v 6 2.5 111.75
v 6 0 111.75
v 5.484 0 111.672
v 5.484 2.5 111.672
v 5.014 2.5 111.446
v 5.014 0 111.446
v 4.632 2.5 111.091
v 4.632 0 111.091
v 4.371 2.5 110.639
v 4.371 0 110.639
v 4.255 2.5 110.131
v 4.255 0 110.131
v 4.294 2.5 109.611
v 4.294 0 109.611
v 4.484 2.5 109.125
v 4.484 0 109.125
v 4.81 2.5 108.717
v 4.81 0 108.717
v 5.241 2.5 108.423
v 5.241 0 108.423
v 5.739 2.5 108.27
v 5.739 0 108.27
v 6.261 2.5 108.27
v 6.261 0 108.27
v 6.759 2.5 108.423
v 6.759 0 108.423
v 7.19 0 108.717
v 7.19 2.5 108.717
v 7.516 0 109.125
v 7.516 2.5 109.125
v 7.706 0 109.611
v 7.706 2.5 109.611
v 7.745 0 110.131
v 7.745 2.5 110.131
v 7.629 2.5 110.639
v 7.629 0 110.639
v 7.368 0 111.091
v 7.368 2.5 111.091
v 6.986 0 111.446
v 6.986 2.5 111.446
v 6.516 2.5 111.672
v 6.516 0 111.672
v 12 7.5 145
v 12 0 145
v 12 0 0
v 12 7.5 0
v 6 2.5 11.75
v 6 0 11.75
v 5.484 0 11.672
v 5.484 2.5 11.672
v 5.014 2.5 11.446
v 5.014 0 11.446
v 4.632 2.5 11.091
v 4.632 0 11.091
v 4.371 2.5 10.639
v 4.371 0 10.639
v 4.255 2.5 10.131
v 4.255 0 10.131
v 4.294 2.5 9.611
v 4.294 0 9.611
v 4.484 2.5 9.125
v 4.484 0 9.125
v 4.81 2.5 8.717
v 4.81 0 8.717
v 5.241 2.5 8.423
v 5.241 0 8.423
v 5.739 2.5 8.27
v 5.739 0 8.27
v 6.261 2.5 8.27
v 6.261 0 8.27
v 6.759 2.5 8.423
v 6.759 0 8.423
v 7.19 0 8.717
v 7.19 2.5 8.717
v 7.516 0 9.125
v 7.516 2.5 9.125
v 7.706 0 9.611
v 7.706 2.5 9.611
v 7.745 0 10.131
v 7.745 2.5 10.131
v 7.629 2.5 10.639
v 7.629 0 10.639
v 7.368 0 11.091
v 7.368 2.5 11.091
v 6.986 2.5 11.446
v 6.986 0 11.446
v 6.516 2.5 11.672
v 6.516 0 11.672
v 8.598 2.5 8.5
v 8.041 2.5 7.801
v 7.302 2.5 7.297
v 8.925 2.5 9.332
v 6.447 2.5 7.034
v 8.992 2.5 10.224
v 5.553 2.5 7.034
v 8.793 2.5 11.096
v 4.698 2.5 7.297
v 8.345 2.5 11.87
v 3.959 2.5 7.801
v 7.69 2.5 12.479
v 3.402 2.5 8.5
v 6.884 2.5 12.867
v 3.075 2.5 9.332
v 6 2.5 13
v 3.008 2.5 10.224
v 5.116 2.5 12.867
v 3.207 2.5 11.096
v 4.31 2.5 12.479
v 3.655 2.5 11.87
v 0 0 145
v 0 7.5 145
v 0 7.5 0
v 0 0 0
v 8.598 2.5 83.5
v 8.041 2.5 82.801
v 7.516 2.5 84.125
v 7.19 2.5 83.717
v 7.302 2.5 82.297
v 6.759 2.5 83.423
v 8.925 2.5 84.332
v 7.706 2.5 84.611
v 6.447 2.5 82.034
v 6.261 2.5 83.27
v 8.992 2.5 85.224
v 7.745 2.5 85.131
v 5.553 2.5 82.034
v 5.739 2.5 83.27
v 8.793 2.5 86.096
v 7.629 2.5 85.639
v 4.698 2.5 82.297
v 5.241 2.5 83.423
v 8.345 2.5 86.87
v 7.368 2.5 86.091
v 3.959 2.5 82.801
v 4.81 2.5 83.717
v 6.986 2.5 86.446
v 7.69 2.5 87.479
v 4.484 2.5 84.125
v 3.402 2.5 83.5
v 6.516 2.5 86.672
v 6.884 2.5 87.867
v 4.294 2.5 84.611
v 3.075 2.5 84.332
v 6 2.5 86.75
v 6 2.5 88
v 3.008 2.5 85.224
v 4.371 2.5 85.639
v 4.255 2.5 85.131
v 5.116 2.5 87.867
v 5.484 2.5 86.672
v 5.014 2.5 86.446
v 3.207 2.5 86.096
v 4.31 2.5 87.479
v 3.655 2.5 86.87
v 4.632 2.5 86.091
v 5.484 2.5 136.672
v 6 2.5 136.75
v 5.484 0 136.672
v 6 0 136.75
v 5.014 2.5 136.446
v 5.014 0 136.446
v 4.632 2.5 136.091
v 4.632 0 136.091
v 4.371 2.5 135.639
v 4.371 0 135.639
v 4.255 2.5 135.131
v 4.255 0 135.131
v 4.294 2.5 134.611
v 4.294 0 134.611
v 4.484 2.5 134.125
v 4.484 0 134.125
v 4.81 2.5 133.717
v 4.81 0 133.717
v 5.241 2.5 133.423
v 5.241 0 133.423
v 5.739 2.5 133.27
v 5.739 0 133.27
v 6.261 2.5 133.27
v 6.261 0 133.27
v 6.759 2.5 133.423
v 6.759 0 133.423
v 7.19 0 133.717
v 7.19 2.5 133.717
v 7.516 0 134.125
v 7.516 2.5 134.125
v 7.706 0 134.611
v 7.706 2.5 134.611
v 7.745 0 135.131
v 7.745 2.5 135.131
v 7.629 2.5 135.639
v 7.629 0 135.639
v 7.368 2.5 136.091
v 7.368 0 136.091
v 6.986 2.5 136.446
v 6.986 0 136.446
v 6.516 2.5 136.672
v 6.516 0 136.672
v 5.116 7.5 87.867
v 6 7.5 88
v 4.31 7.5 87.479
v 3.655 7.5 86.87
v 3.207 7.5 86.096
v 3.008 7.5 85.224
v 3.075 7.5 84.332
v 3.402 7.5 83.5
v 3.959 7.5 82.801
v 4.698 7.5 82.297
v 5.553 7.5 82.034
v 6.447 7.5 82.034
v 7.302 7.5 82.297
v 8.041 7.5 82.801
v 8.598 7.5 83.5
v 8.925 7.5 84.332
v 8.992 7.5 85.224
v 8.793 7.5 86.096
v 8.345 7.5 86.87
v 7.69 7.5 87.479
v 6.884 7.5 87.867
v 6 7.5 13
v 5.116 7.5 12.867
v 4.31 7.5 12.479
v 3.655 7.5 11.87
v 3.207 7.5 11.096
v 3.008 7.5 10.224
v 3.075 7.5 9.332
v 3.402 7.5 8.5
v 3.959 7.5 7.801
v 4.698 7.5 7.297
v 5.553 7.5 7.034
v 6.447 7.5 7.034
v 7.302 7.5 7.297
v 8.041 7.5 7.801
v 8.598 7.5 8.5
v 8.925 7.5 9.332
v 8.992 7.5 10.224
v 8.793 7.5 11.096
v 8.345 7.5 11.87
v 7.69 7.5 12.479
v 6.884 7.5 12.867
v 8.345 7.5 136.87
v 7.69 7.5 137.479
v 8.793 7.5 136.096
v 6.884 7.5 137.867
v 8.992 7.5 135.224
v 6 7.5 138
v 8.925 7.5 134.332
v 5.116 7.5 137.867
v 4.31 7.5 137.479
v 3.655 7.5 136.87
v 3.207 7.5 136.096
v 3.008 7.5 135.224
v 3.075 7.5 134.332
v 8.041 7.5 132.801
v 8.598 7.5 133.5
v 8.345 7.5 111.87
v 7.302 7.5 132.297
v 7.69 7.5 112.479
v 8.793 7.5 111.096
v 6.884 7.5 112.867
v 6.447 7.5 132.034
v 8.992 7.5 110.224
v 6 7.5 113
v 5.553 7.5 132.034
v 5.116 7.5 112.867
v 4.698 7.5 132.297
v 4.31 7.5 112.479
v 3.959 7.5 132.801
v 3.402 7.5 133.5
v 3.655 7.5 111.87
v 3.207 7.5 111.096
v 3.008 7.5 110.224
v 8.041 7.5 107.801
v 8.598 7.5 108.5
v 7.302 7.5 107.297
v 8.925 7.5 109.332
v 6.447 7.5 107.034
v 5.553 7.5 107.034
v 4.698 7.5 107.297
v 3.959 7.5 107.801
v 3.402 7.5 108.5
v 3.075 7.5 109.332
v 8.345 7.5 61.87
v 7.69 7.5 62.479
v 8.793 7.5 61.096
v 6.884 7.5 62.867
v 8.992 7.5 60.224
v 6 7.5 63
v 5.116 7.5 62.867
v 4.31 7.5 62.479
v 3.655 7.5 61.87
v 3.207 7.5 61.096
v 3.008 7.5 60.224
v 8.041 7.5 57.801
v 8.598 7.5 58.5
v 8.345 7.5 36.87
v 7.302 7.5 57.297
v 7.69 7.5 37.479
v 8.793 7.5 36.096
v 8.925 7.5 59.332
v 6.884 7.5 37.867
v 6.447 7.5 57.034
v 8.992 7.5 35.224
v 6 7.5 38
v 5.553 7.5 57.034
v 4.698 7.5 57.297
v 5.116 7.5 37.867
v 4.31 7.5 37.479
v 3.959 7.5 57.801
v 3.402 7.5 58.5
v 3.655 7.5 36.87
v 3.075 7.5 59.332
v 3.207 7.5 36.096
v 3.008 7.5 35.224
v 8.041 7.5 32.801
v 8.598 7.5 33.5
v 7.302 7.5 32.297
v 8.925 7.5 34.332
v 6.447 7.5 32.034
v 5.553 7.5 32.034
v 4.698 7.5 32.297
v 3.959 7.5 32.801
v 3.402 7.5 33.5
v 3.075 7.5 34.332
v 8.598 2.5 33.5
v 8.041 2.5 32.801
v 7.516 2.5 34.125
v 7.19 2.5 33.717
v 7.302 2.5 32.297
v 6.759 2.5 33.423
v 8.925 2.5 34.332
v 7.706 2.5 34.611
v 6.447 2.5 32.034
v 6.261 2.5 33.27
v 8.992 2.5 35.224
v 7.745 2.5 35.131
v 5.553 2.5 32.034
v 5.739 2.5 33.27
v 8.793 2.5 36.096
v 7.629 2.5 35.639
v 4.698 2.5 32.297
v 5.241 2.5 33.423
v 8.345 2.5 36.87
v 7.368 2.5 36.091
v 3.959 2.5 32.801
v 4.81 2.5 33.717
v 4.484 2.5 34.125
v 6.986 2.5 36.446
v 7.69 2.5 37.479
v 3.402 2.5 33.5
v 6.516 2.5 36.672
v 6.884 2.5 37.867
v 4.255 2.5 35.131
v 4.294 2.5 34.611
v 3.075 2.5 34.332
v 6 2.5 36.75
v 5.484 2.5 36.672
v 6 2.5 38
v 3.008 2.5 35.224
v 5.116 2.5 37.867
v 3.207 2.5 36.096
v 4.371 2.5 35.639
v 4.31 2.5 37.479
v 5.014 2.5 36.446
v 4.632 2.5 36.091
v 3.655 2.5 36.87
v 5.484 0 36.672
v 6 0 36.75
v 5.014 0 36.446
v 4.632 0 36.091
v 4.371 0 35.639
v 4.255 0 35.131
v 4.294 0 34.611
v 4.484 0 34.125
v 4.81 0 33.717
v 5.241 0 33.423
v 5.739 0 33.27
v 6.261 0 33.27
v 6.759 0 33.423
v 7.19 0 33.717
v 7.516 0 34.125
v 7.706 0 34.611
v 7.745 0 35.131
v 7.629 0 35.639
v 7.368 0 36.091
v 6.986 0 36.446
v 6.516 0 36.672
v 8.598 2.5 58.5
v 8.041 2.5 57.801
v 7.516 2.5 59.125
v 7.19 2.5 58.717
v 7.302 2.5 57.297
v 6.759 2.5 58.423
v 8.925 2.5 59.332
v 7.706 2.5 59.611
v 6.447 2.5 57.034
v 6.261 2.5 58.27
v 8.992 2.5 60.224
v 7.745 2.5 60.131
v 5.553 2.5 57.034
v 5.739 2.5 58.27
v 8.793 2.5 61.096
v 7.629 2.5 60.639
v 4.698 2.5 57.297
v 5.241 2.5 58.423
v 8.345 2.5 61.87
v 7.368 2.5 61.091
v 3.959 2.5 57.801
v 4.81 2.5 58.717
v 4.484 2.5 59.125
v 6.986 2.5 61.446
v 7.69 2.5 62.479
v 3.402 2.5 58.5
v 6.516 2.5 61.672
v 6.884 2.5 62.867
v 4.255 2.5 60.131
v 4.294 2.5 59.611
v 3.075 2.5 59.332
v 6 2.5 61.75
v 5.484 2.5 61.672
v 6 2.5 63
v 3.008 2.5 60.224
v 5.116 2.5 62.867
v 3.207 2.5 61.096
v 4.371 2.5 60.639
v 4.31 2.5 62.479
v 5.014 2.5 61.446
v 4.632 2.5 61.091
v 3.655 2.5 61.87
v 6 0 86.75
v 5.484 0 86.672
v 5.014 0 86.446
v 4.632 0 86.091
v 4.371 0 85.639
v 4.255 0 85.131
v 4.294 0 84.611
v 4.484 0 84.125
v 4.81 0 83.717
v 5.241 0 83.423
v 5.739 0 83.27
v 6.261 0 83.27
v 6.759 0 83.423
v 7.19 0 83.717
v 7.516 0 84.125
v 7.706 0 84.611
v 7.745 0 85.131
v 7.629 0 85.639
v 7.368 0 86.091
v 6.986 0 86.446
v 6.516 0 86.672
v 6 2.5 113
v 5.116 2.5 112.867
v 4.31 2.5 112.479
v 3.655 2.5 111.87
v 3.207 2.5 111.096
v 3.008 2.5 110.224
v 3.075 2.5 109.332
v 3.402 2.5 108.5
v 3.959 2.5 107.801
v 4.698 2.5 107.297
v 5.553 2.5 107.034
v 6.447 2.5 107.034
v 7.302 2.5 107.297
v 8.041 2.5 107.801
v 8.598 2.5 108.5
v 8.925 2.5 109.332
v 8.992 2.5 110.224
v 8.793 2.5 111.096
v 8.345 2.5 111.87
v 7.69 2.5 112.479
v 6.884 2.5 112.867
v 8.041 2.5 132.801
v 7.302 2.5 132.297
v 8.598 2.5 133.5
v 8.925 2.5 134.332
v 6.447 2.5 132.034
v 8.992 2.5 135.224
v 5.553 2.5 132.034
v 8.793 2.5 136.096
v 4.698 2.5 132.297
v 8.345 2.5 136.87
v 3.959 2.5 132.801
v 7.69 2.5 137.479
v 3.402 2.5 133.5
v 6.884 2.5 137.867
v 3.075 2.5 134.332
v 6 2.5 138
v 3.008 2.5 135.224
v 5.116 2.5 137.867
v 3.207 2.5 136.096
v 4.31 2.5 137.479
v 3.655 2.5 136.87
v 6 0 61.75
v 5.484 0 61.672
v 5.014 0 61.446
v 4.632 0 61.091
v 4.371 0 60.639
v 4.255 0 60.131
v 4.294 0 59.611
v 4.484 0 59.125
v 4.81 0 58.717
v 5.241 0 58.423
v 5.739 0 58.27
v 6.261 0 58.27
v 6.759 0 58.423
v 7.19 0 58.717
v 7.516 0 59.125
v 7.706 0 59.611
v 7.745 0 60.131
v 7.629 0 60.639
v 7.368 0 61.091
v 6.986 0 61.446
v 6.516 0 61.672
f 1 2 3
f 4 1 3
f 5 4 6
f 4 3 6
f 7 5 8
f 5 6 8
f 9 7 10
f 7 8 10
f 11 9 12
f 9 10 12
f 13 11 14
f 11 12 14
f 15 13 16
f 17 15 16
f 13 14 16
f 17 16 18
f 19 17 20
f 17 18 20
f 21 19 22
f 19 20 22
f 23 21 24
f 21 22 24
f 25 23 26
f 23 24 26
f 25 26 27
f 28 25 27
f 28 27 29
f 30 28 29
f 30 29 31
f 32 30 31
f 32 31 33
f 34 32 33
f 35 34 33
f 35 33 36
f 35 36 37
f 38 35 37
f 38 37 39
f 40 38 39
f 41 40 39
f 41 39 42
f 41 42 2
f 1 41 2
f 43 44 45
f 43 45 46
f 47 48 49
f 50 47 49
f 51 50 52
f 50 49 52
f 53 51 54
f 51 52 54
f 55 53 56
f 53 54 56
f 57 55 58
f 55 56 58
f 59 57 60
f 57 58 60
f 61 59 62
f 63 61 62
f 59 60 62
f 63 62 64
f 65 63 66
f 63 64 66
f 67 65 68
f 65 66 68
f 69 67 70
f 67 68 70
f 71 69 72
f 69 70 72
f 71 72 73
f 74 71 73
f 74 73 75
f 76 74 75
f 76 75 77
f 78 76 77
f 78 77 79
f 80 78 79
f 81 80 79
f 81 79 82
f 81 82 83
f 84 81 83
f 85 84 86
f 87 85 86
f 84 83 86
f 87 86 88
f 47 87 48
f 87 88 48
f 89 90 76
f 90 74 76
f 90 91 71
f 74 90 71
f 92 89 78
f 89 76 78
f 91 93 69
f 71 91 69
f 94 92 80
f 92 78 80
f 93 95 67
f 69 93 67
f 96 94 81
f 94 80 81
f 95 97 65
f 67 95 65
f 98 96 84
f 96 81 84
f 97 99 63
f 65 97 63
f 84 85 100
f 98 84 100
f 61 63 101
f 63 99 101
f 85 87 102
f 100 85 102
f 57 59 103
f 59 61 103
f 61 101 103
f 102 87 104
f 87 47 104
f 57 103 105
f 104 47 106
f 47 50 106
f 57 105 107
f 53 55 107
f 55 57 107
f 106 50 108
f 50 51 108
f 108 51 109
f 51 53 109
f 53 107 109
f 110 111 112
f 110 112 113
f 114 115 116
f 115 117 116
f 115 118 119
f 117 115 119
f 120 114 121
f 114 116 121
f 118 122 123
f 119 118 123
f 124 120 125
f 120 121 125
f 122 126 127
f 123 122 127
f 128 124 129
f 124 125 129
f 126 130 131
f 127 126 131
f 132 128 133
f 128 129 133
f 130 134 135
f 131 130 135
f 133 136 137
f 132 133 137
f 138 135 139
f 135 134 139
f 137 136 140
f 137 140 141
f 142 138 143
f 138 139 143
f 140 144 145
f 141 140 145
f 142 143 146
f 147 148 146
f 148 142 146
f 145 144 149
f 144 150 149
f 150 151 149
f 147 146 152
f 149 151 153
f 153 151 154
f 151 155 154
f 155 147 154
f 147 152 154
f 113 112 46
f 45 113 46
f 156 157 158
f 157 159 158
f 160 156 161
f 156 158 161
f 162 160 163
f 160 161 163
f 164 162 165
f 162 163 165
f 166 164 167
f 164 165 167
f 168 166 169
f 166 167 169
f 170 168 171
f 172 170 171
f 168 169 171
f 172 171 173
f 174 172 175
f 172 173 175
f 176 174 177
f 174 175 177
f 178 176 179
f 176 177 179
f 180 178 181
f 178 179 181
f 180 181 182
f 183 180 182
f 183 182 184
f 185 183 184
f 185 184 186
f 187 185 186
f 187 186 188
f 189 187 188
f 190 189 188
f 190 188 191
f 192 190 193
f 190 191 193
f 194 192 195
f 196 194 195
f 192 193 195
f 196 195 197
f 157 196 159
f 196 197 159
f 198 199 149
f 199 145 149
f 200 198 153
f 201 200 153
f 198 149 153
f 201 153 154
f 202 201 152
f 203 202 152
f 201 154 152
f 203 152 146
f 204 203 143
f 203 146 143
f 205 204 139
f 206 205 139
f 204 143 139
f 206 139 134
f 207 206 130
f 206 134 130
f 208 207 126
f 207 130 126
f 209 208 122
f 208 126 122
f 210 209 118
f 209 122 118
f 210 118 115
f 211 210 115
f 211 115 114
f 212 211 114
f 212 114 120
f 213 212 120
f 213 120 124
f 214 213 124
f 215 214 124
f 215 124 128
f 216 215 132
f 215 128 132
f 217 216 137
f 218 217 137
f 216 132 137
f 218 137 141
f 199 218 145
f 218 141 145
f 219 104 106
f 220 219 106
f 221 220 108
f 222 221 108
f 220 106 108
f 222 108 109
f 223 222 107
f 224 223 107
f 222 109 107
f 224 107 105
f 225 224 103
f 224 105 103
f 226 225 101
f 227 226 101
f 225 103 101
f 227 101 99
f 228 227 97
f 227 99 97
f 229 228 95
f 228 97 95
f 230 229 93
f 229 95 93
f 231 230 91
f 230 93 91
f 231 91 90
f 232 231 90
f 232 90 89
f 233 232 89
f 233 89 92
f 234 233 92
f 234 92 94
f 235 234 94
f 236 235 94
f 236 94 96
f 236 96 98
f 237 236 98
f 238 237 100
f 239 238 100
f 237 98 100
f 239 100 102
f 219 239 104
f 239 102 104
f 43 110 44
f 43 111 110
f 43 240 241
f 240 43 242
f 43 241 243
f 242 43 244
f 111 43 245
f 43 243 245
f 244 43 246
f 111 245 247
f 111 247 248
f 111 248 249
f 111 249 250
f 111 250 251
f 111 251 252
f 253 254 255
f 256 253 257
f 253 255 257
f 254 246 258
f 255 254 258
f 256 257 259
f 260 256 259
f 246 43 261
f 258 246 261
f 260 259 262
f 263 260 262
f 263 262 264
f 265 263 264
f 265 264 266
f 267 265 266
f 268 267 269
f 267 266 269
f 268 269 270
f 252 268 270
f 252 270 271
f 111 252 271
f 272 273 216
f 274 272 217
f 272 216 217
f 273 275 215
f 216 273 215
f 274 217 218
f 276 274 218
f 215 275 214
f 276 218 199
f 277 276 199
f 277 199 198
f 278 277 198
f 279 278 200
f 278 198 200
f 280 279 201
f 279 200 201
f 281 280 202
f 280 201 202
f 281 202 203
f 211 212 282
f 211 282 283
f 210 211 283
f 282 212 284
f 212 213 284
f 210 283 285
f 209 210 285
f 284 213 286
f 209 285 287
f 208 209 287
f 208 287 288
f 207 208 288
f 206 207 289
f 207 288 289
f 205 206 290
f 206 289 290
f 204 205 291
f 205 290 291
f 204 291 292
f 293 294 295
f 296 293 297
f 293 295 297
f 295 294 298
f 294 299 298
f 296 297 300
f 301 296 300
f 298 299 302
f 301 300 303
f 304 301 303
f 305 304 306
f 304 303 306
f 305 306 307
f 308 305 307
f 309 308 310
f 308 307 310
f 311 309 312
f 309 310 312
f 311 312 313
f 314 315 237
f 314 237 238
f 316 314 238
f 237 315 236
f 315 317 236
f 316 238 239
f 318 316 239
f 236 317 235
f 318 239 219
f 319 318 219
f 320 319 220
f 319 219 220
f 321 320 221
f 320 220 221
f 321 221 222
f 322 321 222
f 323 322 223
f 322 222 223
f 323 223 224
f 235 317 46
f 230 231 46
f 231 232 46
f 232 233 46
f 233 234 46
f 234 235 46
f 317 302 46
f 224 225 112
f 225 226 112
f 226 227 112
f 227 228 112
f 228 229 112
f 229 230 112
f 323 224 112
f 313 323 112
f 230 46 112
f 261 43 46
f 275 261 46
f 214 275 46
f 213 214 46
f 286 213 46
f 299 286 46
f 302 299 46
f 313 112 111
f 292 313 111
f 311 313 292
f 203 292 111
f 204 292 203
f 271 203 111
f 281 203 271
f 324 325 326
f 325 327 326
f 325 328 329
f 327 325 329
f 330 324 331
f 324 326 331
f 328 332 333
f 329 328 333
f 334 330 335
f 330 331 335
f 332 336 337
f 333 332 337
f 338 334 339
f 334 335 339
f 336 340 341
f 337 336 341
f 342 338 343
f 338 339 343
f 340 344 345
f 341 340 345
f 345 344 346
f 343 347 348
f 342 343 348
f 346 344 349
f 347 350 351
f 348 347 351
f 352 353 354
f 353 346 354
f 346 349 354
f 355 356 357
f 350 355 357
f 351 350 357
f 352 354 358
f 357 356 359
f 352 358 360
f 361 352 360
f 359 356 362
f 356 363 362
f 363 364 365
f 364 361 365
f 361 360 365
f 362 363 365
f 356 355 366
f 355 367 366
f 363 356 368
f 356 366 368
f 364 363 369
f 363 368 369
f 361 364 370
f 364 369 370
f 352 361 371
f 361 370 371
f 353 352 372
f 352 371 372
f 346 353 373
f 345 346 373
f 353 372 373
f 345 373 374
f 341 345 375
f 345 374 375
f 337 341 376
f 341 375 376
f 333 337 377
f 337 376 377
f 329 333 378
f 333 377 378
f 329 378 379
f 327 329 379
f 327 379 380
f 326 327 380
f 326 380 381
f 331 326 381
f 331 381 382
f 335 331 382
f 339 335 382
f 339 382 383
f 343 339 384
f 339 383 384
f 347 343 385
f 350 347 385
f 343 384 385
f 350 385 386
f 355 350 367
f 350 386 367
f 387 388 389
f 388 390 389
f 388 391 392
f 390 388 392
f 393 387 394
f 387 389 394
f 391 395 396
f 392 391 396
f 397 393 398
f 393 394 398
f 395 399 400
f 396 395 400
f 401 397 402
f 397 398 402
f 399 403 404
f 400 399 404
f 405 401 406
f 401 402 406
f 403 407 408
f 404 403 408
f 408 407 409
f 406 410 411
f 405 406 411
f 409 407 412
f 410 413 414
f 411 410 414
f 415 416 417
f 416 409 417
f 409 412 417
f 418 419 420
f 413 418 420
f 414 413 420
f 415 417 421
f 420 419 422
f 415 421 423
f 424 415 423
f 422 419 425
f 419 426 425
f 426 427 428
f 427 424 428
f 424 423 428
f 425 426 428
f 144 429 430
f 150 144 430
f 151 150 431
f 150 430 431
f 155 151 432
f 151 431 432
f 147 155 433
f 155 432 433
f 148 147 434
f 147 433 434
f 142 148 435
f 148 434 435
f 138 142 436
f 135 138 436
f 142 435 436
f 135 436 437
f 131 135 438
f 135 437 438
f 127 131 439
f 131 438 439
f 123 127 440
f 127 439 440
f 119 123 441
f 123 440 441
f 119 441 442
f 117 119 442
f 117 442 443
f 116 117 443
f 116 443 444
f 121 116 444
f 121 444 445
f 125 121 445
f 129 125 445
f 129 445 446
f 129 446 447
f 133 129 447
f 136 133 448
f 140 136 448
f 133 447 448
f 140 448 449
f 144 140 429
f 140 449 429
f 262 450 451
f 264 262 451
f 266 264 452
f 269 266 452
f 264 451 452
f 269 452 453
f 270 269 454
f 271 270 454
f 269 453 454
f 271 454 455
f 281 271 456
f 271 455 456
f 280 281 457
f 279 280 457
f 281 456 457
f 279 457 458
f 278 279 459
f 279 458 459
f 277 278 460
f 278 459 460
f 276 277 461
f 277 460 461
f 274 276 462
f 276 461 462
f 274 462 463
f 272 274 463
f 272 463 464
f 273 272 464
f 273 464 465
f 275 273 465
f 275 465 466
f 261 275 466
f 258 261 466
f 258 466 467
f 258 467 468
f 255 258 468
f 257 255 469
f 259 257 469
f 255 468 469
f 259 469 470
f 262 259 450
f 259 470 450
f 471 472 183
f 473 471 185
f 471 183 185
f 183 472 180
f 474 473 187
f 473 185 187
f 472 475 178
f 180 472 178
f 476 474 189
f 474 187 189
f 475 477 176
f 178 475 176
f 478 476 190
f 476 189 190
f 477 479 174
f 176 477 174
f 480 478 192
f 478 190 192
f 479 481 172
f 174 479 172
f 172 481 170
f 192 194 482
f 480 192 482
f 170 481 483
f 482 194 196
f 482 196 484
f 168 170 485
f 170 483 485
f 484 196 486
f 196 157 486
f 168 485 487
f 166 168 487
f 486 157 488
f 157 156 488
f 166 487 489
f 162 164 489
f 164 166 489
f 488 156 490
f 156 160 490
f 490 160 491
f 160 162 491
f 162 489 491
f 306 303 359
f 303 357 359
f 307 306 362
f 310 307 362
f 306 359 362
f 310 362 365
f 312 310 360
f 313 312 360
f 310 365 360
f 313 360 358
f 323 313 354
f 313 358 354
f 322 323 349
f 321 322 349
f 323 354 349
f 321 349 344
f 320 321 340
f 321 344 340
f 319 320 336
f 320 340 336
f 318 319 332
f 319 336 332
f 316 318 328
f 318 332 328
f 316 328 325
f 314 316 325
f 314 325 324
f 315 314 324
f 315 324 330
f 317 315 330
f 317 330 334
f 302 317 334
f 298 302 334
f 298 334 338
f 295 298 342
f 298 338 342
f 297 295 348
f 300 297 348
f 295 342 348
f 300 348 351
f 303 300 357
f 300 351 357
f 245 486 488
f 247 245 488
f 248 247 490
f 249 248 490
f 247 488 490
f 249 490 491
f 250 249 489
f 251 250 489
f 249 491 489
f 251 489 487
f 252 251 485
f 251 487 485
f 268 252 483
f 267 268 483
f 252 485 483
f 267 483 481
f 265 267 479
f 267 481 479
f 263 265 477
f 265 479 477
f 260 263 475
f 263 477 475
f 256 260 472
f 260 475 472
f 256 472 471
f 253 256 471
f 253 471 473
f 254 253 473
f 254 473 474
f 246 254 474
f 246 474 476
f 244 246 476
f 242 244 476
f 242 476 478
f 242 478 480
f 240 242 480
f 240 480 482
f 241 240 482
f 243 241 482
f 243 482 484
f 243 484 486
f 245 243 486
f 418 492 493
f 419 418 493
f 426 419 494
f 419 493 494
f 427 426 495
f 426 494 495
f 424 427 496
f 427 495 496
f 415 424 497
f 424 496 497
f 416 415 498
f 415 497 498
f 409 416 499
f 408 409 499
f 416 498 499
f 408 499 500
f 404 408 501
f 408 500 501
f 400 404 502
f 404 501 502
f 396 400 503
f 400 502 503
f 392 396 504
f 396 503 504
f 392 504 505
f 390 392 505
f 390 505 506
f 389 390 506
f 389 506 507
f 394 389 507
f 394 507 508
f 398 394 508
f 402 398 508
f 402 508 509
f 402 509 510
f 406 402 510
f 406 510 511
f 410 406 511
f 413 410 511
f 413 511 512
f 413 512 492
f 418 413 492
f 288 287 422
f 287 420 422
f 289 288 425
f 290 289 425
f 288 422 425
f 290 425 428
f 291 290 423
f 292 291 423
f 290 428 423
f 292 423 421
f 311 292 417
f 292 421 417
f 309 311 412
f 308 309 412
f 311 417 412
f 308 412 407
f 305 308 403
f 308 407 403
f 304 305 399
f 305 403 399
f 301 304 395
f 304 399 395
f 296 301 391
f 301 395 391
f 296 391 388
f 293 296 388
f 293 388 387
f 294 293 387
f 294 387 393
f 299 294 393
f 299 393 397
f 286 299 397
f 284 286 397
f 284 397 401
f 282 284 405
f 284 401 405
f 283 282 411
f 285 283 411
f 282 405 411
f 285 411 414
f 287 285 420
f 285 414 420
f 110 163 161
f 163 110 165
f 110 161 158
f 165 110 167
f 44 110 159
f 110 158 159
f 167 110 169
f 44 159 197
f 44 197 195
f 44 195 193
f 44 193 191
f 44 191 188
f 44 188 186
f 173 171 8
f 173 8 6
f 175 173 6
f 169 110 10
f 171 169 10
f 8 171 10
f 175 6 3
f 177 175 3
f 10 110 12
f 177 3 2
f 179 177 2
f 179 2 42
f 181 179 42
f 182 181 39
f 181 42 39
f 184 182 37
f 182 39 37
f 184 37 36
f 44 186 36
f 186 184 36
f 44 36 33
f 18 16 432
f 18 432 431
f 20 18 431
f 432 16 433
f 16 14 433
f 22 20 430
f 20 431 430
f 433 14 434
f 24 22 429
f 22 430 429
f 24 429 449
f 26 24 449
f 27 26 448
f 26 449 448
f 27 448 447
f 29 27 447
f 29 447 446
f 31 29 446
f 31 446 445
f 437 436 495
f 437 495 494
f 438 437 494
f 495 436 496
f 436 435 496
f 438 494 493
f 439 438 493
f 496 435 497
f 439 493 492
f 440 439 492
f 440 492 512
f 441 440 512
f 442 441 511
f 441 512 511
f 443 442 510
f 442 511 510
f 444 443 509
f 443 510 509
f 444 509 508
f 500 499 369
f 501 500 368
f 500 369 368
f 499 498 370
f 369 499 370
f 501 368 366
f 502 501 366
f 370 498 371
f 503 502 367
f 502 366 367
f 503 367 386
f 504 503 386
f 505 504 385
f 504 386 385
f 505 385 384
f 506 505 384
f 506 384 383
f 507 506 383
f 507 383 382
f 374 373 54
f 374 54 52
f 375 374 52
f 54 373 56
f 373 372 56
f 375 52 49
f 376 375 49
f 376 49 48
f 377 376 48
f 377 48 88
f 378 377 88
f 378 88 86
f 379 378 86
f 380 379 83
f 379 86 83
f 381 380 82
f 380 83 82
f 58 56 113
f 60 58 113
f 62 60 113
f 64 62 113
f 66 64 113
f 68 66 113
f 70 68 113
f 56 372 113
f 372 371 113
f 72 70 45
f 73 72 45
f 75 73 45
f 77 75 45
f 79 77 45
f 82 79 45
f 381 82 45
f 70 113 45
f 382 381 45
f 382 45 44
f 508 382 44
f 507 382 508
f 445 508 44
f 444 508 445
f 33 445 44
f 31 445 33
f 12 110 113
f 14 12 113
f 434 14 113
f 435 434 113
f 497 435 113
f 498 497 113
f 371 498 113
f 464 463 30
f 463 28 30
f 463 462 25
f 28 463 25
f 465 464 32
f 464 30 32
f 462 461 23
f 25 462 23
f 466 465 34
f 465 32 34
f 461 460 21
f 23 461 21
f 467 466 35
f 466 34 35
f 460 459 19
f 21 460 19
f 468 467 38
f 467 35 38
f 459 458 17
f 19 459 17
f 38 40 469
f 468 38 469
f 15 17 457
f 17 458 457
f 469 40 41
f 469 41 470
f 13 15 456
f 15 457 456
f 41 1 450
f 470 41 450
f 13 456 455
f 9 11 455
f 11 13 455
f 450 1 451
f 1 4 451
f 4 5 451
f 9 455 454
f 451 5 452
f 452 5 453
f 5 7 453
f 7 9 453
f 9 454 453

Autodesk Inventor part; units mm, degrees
ref_plane "YZ Plane" through (0, 0, 0) normal (1, 0, 0) x (0, 1, 0)
ref_plane "XZ Plane" through (0, 0, 0) normal (0, 1, 0) x (-1, 0, 0)
ref_plane "XY Plane" through (0, 0, 0) normal (0, 0, 1) x (1, 0, 0)
sketch "スケッチ1" plane through (0, 0, 0) normal (0, 0, 1) x (1, 0, 0)
  line L0 (0, 0) -> (12, 0)
  line L1 (12, 0) -> (12, 7.5)
  line L2 (12, 7.5) -> (0, 7.5)
  line L3 (0, 7.5) -> (0, 0)
  dimension "d0" = 12
  dimension "d1" = 7.5
extrude "押し出し1" add sketch "スケッチ1" along normal blind 145
sketch "スケッチ2" plane through (0, 7.5, 0) normal (0, 1, 0) x (1, 0, 0)
  line L0 (12, -145) -> (0, -145) projected
  line L1 (6, -145) -> (6, 0)
  line L2 (12, 0) -> (0, 0) projected
  point P0 (6, -10)
  point P1 (6, -135)
  point P2 (6, -110)
  point P3 (6, -85)
  point P4 (6, -60)
  point P5 (6, -35)
  dimension "d4" = 10
  dimension "d5" = 10
  dimension "d6" = 25
  dimension "d7" = 25
  dimension "d8" = 25
  dimension "d9" = 25
  dimension "d10" = 25
hole "穴1" at (6, 7.5, 10) at (6, 7.5, 135) at (6, 7.5, 110) at (6, 7.5, 85) at (6, 7.5, 60) at (6, 7.5, 35) direction (0, -1, 0) diameter 3.5 end through all
sketch "スケッチ3" plane through (0, 7.5, 0) normal (0, 1, 0) x (1, 0, 0)
  line L0 (12, -145) -> (0, -145)
  line L1 (6, -145) -> (6, 0)
  line L2 (12, 0) -> (0, 0)
  point P0 (6, -10)
  point P1 (6, -135)
  point P2 (6, -110)
  point P3 (6, -85)
  point P4 (6, -60)
  point P5 (6, -35)
  dimension "d18" = 10
  dimension "d19" = 10
  dimension "d20" = 25
  dimension "d21" = 25
  dimension "d22" = 25
  dimension "d23" = 25
  dimension "d24" = 25
hole "穴2" at (6, 7.5, 10) at (6, 7.5, 135) at (6, 7.5, 110) at (6, 7.5, 60) at (6, 7.5, 35) at (6, 7.5, 85) direction (0, -1, 0) diameter 6 depth 5
equation "\"d7\" = d6"
equation "\"d8\" = d6"
equation "\"d9\" = d6"
equation "\"d21\" = d20"
equation "\"d22\" = d20"
equation "\"d23\" = d20"
properties part number "slider" material "アルミニウム 6061-AHC"
